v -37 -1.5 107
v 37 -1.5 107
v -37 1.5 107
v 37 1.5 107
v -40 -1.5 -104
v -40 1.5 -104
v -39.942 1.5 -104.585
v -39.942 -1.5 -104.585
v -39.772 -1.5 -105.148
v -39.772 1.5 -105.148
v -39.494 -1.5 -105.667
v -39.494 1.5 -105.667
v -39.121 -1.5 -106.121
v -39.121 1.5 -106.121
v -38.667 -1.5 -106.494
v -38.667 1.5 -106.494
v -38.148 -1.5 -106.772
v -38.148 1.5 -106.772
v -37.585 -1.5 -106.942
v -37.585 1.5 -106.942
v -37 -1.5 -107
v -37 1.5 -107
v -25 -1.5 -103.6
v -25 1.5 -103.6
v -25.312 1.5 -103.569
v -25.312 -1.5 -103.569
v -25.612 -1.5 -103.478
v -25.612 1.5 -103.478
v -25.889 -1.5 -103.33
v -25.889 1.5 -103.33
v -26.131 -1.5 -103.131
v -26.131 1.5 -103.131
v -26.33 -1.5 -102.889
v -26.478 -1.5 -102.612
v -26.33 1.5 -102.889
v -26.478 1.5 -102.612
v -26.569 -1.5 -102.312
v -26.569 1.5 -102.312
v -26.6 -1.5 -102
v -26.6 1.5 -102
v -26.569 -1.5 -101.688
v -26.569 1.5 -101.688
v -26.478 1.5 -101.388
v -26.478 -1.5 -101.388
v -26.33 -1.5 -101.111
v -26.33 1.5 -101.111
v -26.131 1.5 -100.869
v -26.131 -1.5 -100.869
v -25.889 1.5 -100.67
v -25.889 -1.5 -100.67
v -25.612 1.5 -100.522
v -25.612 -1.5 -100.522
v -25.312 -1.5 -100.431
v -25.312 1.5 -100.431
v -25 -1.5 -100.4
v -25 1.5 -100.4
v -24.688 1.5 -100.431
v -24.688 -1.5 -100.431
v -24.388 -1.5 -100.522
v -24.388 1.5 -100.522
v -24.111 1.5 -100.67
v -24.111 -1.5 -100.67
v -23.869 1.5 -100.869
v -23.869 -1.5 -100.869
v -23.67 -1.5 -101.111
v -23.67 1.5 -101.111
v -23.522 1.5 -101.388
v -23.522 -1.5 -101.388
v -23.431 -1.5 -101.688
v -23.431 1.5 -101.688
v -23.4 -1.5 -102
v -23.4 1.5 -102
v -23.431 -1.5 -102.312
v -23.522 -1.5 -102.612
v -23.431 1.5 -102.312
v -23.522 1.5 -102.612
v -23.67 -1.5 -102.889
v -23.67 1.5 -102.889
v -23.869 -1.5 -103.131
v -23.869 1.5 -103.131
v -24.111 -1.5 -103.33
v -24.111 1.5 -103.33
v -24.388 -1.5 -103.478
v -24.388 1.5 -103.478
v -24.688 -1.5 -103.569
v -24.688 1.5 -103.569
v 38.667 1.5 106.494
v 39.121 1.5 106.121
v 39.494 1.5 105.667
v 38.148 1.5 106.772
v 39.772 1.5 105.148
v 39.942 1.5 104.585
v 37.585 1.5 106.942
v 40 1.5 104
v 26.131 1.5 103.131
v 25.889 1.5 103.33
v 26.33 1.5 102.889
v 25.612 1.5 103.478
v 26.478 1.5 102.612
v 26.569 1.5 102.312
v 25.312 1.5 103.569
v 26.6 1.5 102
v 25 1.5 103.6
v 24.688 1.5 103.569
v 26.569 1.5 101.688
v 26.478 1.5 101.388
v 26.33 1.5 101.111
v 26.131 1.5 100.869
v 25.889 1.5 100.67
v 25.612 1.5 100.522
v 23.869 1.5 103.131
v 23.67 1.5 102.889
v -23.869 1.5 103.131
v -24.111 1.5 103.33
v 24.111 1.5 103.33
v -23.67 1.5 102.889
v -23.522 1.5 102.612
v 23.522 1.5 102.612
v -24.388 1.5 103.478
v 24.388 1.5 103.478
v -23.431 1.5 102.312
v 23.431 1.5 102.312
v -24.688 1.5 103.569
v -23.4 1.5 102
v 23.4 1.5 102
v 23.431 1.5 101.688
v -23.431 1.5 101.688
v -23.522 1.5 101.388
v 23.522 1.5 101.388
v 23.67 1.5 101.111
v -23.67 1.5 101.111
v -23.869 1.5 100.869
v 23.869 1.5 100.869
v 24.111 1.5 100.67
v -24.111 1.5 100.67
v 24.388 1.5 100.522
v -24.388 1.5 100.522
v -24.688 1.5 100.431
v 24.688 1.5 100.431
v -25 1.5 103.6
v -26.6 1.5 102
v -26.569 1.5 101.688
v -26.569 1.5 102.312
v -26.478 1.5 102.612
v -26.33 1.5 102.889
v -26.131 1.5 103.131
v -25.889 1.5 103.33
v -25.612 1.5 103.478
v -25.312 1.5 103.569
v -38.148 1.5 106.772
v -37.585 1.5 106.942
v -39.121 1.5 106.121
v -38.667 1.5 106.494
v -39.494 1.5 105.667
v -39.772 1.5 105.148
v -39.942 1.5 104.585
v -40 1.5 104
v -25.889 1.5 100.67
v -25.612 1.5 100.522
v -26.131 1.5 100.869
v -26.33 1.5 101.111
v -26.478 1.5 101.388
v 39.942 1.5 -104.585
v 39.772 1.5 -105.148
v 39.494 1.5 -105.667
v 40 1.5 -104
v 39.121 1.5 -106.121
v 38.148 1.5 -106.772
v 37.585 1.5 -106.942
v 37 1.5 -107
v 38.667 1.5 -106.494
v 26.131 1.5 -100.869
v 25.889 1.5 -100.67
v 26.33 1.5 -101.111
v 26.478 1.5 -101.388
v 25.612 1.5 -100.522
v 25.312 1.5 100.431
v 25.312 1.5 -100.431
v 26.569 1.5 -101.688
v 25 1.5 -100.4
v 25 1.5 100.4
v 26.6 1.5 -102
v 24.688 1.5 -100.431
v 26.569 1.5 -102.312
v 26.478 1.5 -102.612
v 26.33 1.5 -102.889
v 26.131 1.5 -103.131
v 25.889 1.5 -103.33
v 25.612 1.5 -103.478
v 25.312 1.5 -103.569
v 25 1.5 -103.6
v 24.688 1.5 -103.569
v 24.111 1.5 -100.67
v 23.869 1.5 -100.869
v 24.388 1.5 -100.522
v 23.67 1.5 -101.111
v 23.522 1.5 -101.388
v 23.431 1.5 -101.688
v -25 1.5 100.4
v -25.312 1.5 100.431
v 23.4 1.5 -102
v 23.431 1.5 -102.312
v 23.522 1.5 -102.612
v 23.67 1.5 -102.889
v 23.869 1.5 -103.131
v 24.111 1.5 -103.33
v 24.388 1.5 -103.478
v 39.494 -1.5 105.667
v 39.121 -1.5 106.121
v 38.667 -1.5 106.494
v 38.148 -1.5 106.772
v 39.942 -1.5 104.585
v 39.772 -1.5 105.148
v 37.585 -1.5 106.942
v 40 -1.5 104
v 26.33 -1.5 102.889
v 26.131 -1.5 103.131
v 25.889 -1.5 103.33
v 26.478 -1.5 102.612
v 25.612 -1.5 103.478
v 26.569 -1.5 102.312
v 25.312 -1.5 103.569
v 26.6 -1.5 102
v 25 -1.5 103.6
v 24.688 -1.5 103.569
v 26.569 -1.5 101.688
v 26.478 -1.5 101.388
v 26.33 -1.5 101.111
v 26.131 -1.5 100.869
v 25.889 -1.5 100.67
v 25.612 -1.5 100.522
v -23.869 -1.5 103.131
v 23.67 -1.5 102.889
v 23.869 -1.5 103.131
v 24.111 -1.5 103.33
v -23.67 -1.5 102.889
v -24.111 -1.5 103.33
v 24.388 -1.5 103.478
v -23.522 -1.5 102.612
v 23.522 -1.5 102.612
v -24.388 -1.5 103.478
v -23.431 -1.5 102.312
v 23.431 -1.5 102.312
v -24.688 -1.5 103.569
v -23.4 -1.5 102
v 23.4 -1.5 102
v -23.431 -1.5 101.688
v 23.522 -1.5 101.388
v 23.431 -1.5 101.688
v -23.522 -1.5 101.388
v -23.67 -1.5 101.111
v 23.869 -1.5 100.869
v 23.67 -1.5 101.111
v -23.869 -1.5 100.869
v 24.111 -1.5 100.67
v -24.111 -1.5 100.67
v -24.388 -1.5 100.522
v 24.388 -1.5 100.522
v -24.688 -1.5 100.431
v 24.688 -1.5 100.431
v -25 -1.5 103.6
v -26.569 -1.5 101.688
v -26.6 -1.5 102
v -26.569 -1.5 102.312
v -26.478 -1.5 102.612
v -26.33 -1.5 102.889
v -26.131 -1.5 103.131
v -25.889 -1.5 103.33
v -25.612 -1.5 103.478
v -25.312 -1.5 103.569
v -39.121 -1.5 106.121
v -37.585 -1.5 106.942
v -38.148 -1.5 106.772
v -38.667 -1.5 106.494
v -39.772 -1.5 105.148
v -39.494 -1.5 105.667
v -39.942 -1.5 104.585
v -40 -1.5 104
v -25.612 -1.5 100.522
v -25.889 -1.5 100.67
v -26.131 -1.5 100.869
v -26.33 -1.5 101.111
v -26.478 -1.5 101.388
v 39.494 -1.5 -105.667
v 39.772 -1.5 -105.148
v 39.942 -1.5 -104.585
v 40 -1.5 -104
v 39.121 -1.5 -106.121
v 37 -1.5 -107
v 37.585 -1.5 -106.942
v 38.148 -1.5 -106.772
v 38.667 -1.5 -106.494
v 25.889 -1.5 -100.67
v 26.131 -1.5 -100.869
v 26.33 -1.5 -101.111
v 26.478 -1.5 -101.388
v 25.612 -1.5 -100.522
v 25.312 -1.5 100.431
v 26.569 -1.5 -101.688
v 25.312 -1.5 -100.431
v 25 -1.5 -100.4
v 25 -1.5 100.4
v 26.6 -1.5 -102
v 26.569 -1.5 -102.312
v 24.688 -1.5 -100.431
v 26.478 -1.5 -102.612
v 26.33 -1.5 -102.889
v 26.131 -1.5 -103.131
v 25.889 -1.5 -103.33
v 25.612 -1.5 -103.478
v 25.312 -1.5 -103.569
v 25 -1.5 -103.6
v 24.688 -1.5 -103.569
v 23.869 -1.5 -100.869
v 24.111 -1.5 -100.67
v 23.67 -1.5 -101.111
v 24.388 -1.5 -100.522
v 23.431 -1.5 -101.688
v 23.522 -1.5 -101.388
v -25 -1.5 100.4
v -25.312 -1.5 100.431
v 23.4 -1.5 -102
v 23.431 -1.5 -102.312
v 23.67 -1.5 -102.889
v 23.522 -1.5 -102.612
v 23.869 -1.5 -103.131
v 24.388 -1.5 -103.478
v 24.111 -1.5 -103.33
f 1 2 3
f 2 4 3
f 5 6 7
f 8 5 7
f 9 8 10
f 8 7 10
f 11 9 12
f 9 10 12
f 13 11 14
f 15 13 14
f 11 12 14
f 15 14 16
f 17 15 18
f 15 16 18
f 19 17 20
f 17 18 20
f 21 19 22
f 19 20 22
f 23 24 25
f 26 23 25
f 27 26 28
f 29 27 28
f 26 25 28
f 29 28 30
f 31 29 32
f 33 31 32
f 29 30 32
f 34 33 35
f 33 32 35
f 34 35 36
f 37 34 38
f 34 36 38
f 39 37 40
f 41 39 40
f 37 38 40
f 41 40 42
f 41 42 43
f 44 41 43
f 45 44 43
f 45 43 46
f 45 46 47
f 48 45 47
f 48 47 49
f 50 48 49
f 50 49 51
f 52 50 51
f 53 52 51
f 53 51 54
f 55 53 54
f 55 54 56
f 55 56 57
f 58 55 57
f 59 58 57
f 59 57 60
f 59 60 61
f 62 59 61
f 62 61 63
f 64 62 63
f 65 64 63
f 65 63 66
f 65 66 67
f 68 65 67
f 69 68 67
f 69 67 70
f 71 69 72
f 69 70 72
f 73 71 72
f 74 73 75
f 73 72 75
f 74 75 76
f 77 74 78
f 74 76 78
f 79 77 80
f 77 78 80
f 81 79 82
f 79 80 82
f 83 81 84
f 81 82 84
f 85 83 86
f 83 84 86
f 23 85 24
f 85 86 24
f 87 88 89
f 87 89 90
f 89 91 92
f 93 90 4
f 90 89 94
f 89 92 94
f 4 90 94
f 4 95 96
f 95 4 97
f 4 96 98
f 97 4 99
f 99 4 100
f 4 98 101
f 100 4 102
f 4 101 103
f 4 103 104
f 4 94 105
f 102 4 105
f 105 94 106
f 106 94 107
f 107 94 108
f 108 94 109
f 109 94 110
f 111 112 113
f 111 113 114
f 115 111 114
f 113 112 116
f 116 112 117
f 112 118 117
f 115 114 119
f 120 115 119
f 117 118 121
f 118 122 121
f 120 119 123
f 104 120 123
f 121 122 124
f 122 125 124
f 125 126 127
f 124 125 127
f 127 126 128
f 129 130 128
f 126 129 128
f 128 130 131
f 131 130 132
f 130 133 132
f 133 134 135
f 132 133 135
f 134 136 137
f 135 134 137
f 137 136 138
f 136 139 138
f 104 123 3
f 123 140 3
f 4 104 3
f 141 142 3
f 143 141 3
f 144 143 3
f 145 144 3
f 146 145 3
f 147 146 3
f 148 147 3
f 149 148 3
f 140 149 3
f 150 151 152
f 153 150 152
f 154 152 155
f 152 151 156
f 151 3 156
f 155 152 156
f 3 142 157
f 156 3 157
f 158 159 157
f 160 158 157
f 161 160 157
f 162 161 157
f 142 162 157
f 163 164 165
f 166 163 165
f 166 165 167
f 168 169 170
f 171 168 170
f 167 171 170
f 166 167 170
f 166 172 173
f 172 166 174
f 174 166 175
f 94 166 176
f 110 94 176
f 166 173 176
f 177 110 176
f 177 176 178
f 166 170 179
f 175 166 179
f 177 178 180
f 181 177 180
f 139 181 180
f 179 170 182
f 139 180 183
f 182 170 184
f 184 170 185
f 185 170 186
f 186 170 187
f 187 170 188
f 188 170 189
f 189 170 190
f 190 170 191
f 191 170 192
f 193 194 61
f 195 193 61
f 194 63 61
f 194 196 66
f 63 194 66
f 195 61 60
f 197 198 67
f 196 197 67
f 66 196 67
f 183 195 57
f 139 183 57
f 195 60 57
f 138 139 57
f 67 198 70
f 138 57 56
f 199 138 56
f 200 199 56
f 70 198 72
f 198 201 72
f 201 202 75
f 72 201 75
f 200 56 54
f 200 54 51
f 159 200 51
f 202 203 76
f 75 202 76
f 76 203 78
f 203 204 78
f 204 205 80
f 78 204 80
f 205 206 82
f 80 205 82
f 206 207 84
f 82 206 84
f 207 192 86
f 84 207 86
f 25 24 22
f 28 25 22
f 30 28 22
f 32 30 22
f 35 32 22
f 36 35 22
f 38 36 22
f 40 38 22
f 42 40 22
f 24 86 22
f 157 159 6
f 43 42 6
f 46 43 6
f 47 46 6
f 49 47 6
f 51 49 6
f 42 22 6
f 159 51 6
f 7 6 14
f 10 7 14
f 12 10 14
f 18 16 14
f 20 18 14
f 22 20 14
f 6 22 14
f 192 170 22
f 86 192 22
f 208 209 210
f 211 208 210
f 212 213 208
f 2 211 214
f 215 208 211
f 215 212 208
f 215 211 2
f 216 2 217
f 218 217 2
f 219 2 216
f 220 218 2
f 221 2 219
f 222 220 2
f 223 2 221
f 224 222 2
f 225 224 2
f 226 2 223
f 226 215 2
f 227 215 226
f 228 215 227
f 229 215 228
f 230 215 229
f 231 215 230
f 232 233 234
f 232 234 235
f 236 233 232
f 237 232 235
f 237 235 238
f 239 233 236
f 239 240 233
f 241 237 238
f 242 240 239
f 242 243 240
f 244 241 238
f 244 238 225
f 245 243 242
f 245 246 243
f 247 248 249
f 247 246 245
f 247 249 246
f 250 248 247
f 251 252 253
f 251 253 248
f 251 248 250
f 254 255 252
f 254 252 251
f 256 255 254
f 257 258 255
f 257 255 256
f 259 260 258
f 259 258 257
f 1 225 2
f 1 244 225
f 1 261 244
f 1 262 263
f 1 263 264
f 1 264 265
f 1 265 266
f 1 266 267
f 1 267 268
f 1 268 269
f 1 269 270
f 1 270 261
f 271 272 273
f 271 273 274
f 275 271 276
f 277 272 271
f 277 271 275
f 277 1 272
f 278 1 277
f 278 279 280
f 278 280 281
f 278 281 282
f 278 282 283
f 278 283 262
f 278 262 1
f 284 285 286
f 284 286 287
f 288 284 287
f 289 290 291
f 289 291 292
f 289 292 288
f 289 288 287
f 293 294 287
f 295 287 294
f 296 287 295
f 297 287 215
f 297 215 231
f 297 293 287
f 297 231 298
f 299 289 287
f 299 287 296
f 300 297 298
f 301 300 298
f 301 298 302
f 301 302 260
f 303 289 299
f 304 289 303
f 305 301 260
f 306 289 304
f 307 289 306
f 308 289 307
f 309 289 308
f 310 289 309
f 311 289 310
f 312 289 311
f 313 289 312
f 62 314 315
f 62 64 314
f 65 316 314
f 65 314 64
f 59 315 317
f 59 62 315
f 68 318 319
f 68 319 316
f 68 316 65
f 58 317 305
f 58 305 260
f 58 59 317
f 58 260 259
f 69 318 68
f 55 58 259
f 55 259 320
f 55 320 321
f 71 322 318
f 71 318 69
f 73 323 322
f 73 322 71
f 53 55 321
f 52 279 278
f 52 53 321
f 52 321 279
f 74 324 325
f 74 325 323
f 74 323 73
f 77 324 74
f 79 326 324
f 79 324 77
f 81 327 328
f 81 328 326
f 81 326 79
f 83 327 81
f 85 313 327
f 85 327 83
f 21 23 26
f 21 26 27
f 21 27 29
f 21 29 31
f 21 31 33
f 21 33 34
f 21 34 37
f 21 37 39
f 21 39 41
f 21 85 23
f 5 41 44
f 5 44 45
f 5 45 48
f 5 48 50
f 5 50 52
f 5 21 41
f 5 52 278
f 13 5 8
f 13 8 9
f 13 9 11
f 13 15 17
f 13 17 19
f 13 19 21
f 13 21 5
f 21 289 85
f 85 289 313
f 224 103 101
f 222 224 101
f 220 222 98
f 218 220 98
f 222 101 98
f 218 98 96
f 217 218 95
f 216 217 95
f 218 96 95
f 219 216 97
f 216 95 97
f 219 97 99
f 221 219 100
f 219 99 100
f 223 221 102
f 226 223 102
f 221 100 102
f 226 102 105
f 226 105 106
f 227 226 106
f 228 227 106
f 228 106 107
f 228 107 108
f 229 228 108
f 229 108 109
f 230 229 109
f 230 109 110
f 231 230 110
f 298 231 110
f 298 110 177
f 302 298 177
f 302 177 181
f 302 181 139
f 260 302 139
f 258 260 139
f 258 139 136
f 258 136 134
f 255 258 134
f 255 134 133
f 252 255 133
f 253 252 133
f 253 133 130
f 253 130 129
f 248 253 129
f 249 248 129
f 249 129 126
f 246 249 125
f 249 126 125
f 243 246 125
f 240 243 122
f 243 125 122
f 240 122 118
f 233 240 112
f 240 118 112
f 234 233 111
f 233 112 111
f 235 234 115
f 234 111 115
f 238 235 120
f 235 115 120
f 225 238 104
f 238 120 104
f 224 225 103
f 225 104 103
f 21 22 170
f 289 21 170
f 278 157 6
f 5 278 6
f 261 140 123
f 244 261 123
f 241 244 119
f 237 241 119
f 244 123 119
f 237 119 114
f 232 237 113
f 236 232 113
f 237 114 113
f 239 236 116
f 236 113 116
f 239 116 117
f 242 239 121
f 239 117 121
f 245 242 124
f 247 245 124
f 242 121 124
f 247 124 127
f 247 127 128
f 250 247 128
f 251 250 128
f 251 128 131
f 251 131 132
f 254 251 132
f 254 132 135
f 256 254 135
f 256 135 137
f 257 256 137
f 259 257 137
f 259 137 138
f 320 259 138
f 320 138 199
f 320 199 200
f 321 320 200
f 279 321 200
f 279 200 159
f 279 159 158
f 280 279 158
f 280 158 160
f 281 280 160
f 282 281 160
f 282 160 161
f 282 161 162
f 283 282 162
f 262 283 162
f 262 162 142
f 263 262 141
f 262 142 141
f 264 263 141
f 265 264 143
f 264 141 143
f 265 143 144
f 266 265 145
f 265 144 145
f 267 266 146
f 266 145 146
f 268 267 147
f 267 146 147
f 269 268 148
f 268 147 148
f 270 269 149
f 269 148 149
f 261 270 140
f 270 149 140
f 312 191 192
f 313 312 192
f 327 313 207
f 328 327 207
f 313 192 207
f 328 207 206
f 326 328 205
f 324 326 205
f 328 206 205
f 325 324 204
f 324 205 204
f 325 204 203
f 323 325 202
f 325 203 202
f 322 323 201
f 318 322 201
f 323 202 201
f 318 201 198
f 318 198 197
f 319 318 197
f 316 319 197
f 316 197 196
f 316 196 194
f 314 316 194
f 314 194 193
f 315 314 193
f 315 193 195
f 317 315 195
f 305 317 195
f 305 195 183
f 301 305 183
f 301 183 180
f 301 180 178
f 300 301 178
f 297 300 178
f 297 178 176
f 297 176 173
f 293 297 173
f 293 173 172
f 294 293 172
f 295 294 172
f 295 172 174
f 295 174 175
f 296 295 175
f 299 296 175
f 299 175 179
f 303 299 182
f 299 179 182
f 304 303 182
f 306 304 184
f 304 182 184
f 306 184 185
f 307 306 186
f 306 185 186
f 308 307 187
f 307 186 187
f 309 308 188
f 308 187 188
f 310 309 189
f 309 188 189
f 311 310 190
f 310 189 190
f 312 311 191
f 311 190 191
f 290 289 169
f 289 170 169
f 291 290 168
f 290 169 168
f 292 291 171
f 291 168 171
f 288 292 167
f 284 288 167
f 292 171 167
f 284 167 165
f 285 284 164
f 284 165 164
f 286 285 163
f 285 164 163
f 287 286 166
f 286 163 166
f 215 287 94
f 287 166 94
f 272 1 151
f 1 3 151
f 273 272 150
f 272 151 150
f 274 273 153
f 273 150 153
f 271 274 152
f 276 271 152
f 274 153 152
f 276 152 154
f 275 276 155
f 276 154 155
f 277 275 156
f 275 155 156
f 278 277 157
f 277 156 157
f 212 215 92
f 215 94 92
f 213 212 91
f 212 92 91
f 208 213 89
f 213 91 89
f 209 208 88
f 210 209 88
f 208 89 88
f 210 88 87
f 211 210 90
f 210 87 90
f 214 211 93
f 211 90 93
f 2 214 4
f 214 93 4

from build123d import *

# Parameters (mm, degrees)
SPINE_BODY_DEPTH = 1.5
SKETCH2_R        = 1.6
TAB_HOLES_DEPTH  = 115.271606272


with BuildPart() as part:
    # Sketch1 → Spine_Body (new, symmetric)
    with BuildSketch(Plane(origin=(0, 0, 0), x_dir=(1, 0, 0), z_dir=(0, 1, 0))):
        with BuildLine():
            Line((-37, 107), (37, 107))
            ThreePointArc((37, 107), (39.121320344, 106.121320344), (40, 104))
            Line((40, 104), (40, -104))
            ThreePointArc((40, -104), (39.121320344, -106.121320344), (37, -107))
            Line((37, -107), (-37, -107))
            ThreePointArc((-37, -107), (-39.121320344, -106.121320344), (-40, -104))
            Line((-40, -104), (-40, 104))
            ThreePointArc((-40, 104), (-39.121320344, 106.121320344), (-37, 107))
        make_face()
    extrude(amount=SPINE_BODY_DEPTH, both=True)

    # Sketch2 → Tab_Holes (cut, through all)
    with BuildSketch(Plane(origin=(0, 1.5, 0), x_dir=(1, 0, 0), z_dir=(0, 1, 0))):
        with Locations(Location((-25, -102, 0), (0, 0, 270))):
            Circle(SKETCH2_R)
        with Locations(Location((25, -102, 0), (0, 0, 270))):
            Circle(SKETCH2_R)
        with Locations(Location((25, 102, 0), (0, 0, 90))):
            Circle(SKETCH2_R)
        with Locations(Location((-25, 102, 0), (0, 0, 90))):
            Circle(SKETCH2_R)
    extrude(amount=-TAB_HOLES_DEPTH, mode=Mode.SUBTRACT)


solid = part.part
